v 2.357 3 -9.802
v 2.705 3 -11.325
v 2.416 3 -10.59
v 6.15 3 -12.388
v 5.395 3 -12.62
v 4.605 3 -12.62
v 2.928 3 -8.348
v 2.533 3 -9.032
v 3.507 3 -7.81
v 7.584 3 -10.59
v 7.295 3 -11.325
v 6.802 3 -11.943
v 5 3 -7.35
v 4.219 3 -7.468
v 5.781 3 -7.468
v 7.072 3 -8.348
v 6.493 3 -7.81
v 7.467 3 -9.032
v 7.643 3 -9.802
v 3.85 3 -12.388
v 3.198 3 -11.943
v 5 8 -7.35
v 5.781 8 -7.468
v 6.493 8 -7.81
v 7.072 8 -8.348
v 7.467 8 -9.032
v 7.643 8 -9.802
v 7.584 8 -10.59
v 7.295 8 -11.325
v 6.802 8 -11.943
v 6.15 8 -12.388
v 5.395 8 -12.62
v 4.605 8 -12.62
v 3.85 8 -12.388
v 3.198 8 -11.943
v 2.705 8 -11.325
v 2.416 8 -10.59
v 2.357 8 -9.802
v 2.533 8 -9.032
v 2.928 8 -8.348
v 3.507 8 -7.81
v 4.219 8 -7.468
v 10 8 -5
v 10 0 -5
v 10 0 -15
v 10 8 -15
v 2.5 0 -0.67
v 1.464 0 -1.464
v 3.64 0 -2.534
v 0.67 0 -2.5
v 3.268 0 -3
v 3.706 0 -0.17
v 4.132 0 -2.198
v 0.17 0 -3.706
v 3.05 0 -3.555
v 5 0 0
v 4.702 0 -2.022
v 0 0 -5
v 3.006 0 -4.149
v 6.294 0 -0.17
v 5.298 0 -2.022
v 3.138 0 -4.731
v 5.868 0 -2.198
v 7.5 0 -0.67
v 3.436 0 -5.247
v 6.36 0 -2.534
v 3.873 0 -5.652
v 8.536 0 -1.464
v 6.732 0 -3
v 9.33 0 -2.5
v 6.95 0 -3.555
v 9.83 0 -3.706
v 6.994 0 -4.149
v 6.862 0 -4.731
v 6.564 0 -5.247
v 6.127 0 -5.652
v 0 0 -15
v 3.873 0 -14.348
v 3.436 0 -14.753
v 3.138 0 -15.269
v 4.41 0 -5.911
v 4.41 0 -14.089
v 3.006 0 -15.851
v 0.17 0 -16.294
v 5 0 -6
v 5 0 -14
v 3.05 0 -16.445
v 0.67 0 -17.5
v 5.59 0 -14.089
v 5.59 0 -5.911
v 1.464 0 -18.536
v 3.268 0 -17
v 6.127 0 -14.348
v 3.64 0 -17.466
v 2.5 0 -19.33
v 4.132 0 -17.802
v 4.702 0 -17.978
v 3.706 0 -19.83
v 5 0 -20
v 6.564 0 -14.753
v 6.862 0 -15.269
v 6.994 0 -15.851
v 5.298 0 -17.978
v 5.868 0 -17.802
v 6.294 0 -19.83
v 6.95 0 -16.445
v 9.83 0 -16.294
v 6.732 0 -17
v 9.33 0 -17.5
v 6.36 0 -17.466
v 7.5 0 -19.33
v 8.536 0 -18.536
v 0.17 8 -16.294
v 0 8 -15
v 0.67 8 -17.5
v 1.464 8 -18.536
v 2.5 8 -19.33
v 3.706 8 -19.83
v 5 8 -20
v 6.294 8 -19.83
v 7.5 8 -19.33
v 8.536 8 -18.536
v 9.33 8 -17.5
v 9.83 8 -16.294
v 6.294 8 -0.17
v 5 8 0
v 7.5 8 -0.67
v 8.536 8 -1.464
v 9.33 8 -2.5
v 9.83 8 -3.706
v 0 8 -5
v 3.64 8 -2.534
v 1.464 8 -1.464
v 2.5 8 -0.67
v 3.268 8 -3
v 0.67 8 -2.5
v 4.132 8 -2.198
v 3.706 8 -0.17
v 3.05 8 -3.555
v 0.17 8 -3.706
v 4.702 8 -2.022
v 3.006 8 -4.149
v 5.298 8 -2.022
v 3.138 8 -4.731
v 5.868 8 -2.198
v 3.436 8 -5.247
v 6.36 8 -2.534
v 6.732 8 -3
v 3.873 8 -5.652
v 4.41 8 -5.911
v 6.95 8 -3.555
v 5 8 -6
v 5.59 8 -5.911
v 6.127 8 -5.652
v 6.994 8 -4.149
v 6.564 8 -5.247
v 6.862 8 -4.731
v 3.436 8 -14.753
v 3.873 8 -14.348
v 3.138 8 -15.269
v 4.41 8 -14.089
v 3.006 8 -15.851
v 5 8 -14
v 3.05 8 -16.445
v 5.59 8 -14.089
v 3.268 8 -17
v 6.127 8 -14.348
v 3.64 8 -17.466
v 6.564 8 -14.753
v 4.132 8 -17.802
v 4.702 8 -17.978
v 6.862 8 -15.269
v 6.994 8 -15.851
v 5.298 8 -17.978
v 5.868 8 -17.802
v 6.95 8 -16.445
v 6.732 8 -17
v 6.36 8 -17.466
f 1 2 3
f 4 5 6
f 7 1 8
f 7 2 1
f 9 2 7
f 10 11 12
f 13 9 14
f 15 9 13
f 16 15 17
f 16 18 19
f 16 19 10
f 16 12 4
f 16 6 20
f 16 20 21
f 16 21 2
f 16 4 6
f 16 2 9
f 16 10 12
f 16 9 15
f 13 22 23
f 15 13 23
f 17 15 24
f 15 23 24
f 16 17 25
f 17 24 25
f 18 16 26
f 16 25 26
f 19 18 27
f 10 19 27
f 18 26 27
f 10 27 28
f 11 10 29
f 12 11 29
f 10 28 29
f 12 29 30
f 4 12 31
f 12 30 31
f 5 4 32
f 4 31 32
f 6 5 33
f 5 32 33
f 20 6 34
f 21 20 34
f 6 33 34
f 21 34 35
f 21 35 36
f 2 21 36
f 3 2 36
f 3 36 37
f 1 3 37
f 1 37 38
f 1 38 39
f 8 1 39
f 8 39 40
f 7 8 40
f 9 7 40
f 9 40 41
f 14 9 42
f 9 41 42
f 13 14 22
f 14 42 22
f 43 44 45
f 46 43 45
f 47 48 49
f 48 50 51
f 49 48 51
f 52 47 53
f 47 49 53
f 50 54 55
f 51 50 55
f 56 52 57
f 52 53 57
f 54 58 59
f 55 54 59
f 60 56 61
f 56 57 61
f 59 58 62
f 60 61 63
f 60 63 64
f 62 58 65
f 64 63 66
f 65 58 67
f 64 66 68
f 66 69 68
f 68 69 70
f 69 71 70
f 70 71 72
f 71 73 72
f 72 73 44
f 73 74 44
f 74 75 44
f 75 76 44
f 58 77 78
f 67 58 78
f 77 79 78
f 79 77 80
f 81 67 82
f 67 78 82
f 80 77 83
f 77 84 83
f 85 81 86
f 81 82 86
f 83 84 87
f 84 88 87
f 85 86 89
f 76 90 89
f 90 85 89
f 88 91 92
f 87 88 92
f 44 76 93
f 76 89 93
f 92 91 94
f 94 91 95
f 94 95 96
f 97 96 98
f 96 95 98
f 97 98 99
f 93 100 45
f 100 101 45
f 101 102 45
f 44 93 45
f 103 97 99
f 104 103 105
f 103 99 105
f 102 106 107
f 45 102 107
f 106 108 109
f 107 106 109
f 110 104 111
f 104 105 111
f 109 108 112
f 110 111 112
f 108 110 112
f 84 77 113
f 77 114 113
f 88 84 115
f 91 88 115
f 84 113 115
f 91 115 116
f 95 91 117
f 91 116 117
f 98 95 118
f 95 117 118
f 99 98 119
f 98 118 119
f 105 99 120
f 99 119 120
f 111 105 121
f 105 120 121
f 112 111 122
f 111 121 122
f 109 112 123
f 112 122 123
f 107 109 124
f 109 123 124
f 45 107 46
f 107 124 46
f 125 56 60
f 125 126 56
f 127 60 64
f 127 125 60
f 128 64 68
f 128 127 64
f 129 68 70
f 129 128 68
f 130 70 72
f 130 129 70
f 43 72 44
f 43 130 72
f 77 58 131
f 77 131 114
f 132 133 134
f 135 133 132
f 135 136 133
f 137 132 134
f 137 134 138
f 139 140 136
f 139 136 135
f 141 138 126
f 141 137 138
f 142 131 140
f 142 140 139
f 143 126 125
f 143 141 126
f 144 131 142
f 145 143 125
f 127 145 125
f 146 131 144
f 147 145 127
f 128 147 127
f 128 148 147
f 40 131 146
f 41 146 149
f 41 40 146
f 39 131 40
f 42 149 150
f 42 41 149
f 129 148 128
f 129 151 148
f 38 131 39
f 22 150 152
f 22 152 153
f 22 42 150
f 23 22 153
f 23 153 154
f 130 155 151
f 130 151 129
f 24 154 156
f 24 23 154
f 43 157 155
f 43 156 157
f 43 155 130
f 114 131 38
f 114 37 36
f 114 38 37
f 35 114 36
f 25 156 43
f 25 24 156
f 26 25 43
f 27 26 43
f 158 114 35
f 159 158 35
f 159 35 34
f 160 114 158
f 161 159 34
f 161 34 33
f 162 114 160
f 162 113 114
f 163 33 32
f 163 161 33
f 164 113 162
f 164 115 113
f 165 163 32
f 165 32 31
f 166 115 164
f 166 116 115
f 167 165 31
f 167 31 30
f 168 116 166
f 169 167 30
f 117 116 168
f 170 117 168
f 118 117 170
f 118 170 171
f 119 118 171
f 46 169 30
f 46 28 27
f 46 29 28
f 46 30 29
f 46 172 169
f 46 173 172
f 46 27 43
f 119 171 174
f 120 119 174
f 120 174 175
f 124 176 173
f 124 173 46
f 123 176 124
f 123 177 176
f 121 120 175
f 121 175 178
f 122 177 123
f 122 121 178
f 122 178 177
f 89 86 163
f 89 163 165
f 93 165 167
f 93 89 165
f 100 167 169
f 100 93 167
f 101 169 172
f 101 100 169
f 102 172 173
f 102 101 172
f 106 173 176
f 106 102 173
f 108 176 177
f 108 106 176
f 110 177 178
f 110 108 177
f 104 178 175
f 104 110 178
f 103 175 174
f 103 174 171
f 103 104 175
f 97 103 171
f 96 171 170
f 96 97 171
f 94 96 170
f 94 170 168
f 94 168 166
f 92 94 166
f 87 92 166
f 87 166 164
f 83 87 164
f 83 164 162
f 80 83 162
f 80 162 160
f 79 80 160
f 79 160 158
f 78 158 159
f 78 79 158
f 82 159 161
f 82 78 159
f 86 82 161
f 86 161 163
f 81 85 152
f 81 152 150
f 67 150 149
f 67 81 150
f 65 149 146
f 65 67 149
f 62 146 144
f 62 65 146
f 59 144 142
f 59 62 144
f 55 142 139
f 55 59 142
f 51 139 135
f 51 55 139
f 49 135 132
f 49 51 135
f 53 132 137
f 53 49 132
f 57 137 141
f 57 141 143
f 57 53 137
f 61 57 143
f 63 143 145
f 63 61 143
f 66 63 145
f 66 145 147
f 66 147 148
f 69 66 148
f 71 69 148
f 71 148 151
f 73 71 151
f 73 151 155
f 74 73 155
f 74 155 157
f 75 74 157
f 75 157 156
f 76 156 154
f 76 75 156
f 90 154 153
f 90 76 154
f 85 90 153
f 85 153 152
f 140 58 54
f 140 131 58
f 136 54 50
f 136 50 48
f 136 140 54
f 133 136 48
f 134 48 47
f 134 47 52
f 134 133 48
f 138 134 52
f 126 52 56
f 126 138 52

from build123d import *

# Parameters (mm, degrees)
ESQUISSE1_W             = 10
ESQUISSE1_H             = 20
ESQUISSE1_R             = 2
BOSS_EXTRU_1_DEPTH      = 8
ESQUISSE2_R             = 2.65
ENL_V_MAT_EXTRU_1_DEPTH = 5
CONG_1_R                = 5


with BuildPart() as part:
    # Esquisse1 → Boss.-Extru.1 (new body)
    with BuildSketch(Plane(origin=(0, 0, 0), x_dir=(1, 0, 0), z_dir=(0, 1, 0))):
        with Locations((5, 10)):
            Rectangle(ESQUISSE1_W, ESQUISSE1_H)
        with Locations(Location((5, 16, 0), (0, 0, 270))):
            Circle(ESQUISSE1_R, mode=Mode.SUBTRACT)
        with Locations(Location((5, 4, 0), (0, 0, 90))):
            Circle(ESQUISSE1_R, mode=Mode.SUBTRACT)
    extrude(amount=BOSS_EXTRU_1_DEPTH)

    # Esquisse2 → Enlèv. mat.-Extru.1 (cut)
    with BuildSketch(Plane(origin=(0, 8, 0), x_dir=(1, 0, 0), z_dir=(0, 1, 0))):
        with Locations(Location((5, 10, 0), (0, 0, 270))):
            Circle(ESQUISSE2_R)
    extrude(amount=-ENL_V_MAT_EXTRU_1_DEPTH, mode=Mode.SUBTRACT)

    # Congé1
    cong_1_edges = [part.edges().sort_by_distance(p)[0] for p in [
        (0, 4, 0),
        (10, 4, 0),
        (0, 4, -20),
        (10, 4, -20),
    ]]
    fillet(cong_1_edges, radius=CONG_1_R - 0.0001)  # a hair under: the kernel refuses the full size


solid = part.part
